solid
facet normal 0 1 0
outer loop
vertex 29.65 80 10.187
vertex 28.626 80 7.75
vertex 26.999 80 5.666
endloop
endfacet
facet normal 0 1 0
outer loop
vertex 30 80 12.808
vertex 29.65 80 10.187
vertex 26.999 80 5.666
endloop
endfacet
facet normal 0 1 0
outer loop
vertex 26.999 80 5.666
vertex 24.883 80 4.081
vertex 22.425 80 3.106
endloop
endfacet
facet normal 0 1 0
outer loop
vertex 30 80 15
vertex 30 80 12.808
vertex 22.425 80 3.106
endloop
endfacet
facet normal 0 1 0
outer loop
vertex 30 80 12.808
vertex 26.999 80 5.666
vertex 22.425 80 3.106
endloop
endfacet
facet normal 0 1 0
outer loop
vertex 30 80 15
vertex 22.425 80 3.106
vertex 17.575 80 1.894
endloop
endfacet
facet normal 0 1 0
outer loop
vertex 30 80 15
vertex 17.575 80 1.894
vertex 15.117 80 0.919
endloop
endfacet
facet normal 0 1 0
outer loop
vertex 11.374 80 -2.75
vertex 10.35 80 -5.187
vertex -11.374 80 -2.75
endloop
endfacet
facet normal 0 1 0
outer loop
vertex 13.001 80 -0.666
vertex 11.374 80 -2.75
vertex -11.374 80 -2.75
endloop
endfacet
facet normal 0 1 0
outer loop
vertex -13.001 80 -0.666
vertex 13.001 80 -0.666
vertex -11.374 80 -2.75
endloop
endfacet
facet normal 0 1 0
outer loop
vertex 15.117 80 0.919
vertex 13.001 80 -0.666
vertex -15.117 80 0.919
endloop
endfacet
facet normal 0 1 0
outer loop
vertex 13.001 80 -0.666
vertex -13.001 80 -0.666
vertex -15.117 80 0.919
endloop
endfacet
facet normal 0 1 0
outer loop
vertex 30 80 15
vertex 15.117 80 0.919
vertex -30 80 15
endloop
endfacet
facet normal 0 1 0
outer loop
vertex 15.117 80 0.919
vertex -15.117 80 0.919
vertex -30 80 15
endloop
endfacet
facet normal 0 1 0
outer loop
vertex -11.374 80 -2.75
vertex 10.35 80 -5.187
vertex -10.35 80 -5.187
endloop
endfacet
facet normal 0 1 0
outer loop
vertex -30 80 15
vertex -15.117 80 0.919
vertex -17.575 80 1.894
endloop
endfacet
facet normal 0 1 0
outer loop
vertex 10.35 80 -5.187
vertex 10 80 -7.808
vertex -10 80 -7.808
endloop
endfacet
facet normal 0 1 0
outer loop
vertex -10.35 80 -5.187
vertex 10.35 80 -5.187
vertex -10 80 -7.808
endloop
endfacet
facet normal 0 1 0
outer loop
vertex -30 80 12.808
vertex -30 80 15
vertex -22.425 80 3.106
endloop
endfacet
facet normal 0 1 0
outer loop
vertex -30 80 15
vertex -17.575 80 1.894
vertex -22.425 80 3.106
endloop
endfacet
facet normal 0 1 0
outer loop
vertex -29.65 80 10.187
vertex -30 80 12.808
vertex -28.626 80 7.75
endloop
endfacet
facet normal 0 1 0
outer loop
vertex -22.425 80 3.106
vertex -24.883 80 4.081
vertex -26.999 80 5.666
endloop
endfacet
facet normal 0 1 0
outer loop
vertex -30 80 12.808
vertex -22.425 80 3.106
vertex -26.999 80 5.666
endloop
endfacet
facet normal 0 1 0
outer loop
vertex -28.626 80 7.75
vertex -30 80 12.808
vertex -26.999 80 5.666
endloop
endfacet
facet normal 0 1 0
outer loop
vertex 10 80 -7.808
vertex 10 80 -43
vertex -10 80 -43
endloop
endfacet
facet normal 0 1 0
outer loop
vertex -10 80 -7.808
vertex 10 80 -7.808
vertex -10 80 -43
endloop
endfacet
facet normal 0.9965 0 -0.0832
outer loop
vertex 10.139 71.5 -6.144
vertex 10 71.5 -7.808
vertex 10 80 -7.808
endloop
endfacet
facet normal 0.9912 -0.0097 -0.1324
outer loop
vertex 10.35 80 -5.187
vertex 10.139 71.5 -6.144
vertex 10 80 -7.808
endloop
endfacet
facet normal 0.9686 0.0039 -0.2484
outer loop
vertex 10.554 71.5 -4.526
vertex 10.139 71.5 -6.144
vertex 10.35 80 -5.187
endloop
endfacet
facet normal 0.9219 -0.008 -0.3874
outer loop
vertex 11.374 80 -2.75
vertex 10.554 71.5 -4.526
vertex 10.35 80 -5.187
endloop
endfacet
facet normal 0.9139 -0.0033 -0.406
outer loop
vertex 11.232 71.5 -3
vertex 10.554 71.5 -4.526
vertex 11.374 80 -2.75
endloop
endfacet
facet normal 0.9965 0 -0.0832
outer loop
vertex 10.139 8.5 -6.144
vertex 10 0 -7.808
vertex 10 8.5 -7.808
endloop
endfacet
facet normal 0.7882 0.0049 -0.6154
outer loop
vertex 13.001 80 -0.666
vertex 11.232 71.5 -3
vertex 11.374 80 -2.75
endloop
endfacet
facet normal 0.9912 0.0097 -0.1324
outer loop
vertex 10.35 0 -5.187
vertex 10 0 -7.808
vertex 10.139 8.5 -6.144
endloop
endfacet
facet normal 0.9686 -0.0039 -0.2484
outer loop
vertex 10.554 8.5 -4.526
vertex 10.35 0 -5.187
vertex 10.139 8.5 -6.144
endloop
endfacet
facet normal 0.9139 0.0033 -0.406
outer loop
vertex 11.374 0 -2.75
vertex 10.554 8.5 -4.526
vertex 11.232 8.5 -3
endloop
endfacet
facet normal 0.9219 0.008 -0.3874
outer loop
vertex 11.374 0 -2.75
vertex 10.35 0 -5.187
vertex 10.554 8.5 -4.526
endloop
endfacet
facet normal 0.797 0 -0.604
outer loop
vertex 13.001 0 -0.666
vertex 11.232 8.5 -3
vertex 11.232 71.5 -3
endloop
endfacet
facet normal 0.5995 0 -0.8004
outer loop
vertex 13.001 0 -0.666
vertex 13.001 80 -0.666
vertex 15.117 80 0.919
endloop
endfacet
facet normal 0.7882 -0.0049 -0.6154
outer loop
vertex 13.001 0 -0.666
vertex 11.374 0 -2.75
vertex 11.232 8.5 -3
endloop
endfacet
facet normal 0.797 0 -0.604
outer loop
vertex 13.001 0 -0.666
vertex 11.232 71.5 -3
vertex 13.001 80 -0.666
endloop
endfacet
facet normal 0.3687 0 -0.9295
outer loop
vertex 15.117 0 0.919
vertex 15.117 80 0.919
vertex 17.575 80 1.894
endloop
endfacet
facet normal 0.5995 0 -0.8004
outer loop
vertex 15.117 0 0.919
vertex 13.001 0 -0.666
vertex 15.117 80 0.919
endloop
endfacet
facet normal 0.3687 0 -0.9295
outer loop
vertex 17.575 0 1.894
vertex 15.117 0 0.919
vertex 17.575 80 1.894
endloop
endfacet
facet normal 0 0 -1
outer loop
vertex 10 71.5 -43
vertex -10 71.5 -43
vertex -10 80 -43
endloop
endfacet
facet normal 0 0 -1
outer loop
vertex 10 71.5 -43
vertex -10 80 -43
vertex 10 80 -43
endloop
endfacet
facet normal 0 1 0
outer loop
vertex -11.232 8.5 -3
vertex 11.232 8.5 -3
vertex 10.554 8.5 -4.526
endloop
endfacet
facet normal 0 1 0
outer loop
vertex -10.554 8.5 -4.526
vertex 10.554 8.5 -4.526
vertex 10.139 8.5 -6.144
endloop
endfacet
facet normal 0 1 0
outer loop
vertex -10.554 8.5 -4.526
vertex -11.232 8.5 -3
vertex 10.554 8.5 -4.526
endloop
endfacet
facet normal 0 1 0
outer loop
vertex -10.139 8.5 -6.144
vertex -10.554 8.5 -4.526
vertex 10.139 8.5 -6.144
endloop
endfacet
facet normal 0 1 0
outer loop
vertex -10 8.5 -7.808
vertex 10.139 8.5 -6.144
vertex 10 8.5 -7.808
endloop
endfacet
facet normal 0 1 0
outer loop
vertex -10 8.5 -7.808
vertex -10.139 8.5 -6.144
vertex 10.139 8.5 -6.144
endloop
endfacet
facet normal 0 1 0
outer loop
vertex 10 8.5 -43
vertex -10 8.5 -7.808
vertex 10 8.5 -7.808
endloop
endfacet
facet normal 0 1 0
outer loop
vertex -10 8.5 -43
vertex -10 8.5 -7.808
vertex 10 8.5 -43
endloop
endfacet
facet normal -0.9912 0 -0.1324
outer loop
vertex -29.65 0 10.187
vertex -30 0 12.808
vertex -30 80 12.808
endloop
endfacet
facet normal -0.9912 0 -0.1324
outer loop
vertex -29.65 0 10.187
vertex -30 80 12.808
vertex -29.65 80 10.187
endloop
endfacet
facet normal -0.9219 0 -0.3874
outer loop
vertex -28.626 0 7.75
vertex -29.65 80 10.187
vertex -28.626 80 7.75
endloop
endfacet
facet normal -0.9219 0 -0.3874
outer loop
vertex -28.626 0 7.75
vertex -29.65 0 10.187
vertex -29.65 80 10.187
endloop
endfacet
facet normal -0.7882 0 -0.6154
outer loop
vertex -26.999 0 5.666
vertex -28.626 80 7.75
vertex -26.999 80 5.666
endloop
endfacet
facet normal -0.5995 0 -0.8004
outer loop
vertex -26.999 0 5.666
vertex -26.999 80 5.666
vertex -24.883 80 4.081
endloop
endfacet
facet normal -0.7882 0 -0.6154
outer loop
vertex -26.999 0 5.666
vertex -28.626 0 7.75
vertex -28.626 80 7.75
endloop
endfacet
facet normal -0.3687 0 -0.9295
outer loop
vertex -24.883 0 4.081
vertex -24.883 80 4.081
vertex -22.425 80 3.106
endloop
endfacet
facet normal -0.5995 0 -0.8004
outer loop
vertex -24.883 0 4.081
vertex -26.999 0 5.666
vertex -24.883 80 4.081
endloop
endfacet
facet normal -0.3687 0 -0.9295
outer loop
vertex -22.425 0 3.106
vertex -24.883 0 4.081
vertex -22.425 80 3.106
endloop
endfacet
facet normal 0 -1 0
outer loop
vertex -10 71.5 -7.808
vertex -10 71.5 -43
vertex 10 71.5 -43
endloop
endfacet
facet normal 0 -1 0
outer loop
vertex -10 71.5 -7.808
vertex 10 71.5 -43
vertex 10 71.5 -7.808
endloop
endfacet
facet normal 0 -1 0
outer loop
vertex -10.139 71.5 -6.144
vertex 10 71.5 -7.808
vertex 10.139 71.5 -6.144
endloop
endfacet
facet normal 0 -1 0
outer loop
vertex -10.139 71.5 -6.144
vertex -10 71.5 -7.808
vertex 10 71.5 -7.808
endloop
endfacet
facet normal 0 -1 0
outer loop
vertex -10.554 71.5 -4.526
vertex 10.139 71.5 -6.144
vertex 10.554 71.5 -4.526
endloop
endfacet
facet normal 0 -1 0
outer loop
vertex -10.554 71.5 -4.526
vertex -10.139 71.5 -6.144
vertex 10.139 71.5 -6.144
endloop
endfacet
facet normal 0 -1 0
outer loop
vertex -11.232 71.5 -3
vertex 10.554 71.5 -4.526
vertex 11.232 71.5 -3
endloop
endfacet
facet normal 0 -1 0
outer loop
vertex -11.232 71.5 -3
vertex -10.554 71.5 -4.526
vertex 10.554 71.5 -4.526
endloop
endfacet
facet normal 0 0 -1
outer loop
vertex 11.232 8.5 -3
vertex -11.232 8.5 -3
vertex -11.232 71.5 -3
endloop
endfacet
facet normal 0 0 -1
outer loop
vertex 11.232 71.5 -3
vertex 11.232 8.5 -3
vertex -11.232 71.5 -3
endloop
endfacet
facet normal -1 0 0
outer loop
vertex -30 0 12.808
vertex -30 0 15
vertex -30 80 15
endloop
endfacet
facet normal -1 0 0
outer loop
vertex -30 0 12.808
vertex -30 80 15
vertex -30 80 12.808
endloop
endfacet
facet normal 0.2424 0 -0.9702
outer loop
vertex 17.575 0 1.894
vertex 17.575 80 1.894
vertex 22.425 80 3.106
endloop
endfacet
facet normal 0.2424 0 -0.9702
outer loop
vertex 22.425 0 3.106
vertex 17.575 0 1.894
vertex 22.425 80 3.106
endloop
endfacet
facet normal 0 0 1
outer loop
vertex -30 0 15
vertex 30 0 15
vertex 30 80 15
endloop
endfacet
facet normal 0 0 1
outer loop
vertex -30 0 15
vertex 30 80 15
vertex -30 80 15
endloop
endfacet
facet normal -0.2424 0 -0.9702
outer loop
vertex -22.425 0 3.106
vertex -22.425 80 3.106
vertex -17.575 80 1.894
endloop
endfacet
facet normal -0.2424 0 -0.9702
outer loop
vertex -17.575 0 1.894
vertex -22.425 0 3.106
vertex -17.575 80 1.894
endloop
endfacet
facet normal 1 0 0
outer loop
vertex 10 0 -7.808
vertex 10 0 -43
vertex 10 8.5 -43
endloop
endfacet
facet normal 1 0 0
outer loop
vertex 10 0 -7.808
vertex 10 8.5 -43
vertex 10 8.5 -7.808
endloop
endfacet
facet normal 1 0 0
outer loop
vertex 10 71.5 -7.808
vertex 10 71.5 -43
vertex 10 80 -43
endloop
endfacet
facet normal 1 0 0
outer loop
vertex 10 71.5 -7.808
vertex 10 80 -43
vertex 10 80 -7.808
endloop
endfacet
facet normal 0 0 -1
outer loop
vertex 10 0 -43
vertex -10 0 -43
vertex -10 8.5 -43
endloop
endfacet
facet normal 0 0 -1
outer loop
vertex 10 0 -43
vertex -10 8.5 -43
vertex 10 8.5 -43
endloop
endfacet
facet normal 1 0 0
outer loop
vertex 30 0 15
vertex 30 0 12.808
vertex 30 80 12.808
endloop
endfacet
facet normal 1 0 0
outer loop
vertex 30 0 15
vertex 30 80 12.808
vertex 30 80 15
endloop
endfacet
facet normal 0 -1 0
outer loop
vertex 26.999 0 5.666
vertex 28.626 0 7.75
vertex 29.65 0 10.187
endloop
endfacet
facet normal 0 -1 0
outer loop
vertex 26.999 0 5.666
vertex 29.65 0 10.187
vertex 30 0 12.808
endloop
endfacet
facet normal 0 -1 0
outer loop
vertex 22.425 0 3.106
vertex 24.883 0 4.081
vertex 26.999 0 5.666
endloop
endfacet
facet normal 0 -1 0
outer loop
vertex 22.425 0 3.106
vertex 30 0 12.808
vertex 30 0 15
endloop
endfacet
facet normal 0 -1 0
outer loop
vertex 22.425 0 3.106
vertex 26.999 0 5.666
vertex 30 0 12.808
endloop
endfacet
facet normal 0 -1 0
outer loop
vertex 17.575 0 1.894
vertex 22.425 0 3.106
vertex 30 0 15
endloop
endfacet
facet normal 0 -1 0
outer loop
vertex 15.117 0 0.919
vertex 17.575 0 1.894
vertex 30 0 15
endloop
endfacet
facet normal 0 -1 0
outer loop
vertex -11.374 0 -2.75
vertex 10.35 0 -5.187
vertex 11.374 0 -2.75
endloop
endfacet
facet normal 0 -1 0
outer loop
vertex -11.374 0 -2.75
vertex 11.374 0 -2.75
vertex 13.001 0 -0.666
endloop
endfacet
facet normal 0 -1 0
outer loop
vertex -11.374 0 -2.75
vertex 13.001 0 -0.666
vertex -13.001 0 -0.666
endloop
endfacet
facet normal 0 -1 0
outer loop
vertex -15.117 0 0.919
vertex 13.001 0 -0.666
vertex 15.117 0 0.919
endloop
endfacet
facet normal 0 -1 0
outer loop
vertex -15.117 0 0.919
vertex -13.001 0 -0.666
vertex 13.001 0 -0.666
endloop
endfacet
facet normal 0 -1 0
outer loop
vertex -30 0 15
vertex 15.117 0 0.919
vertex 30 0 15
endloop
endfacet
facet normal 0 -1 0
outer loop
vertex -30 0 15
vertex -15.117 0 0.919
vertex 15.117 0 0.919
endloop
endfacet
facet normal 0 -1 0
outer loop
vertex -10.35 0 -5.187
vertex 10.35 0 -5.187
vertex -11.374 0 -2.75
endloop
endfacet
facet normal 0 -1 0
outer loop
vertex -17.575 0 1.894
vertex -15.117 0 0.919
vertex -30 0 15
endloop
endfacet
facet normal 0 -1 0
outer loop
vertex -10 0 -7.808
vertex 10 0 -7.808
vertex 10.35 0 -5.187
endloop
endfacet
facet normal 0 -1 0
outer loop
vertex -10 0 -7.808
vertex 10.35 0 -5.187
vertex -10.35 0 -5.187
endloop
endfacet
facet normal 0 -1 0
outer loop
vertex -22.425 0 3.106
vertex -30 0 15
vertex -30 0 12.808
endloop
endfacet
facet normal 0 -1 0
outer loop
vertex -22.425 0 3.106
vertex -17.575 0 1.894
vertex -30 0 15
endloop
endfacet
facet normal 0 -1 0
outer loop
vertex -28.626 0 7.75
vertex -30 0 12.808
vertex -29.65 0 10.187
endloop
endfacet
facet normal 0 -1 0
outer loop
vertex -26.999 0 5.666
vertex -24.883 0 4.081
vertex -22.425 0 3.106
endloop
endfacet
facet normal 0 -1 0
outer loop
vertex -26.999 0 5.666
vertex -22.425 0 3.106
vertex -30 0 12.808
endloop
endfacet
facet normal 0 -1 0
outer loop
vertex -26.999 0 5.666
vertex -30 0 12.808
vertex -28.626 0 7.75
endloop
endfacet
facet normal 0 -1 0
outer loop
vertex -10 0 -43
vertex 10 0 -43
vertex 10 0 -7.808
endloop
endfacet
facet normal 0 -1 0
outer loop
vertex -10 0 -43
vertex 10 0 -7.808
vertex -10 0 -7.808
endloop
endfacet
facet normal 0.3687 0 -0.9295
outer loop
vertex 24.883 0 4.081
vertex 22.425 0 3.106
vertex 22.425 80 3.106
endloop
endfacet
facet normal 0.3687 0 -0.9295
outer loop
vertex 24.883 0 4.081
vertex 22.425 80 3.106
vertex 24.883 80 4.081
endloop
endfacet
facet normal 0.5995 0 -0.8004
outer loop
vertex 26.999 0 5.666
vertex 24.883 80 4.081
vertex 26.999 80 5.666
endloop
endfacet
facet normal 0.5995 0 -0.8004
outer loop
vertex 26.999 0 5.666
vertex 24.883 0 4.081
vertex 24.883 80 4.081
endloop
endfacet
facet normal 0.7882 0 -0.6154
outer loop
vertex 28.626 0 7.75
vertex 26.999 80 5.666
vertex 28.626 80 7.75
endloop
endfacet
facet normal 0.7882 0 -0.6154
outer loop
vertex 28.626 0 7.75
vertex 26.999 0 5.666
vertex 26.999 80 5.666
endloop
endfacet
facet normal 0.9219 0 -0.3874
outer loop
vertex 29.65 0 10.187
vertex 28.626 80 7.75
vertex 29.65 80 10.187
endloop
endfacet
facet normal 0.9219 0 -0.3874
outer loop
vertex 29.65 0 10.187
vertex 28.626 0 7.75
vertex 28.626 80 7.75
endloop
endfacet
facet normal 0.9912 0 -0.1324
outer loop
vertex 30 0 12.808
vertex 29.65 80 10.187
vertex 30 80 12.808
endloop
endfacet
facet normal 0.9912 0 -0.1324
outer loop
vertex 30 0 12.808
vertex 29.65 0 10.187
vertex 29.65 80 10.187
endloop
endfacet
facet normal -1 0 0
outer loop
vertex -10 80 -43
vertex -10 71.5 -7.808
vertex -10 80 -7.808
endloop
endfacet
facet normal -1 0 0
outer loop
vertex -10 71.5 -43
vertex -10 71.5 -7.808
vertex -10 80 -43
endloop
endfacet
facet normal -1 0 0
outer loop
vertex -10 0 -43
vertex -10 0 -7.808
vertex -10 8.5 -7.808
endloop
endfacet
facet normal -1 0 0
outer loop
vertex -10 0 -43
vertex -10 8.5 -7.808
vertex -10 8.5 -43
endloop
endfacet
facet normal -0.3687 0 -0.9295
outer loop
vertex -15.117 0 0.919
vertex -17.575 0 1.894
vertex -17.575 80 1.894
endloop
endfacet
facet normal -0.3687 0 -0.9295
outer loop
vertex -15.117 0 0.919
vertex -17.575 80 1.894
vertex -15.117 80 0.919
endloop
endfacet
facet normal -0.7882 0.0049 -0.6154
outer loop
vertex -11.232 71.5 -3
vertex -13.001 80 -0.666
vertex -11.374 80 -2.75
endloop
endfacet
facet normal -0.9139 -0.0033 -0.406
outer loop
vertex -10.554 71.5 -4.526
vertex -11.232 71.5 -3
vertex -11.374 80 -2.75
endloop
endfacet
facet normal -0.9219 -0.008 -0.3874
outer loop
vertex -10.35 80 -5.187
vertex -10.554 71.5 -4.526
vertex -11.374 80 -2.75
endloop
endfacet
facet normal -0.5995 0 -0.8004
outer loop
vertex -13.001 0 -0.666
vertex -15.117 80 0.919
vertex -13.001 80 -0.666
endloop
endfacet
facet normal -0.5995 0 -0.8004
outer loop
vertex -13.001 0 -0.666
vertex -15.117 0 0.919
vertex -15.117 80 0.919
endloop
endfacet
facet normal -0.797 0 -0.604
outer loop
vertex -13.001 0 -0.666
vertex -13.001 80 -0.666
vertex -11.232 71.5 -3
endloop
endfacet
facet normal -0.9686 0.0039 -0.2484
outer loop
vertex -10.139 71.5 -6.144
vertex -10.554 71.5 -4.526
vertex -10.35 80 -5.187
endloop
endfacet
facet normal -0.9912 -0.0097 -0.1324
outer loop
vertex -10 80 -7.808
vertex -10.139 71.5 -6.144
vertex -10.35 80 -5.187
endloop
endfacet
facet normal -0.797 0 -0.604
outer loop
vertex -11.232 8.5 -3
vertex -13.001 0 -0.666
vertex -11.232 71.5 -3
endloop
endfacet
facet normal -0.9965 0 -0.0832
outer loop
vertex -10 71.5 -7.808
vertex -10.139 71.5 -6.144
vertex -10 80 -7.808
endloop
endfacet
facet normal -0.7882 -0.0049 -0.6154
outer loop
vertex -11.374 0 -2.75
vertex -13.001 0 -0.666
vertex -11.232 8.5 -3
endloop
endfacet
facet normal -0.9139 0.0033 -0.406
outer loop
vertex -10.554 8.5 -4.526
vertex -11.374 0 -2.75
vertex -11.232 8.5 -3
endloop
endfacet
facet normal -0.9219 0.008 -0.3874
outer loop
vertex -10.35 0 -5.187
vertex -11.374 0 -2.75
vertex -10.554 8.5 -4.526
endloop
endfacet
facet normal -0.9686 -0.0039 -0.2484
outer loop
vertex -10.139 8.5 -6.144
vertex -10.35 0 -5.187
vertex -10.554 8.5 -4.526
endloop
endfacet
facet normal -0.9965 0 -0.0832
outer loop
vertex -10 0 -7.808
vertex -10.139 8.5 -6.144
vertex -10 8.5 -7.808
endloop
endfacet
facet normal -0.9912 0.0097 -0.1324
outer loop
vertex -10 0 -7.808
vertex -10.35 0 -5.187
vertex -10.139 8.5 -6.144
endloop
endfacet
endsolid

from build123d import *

# Parameters (mm, degrees)
BOSS_EXTRUDE1_DEPTH     = 80
CUT_EXTRUDE1_DEPTH      = 96.650405122
CUT_EXTRUDE1_DEPTH_BACK = 96.650405122


with BuildPart() as part:
    # Sketch1 → Boss-Extrude1 (new body)
    with BuildSketch(Plane(origin=(0, 0, 0), x_dir=(1, 0, 0), z_dir=(0, 1, 0))):
        with BuildLine():
            Line((0, -15), (-30, -15))
            Line((-30, -15), (-30, -12.807764064))
            ThreePointArc((-30, -12.807764064), (-27.88205438, -6.65364197), (-22.42535625, -3.106339063))
            Line((-22.42535625, -3.106339063), (-17.57464375, -1.893660937))
            ThreePointArc((-17.57464375, -1.893660937), (-12.11794562, 1.65364197), (-10, 7.807764064))
            Line((-10, 7.807764064), (-10, 43))
            Line((-10, 43), (0, 43))
            Line((0, 43), (10, 43))
            Line((10, 43), (10, 7.807764064))
            ThreePointArc((10, 7.807764064), (12.11794562, 1.65364197), (17.57464375, -1.893660937))
            Line((17.57464375, -1.893660937), (22.42535625, -3.106339063))
            ThreePointArc((22.42535625, -3.106339063), (27.88205438, -6.65364197), (30, -12.807764064))
            Line((30, -12.807764064), (30, -15))
            Line((30, -15), (0, -15))
        make_face()
    extrude(amount=BOSS_EXTRUDE1_DEPTH)

    # Sketch2 → Cut-Extrude1 (cut, two sides: drawn at the far end of the back side and taken through both)
    with BuildSketch(Plane(origin=(0, 0, 0), x_dir=(0, 0, -1), z_dir=(1, 0, 0)).offset(-CUT_EXTRUDE1_DEPTH_BACK)):
        Polygon((237.133104031, 8.5), (43, 8.5), (3, 8.5), (3, 71.5), (43, 71.5), (237.133104031, 71.5), (625.399312092, 71.5), (625.399312092, 8.5), align=None)
    extrude(amount=CUT_EXTRUDE1_DEPTH + CUT_EXTRUDE1_DEPTH_BACK, mode=Mode.SUBTRACT)


solid = part.part
